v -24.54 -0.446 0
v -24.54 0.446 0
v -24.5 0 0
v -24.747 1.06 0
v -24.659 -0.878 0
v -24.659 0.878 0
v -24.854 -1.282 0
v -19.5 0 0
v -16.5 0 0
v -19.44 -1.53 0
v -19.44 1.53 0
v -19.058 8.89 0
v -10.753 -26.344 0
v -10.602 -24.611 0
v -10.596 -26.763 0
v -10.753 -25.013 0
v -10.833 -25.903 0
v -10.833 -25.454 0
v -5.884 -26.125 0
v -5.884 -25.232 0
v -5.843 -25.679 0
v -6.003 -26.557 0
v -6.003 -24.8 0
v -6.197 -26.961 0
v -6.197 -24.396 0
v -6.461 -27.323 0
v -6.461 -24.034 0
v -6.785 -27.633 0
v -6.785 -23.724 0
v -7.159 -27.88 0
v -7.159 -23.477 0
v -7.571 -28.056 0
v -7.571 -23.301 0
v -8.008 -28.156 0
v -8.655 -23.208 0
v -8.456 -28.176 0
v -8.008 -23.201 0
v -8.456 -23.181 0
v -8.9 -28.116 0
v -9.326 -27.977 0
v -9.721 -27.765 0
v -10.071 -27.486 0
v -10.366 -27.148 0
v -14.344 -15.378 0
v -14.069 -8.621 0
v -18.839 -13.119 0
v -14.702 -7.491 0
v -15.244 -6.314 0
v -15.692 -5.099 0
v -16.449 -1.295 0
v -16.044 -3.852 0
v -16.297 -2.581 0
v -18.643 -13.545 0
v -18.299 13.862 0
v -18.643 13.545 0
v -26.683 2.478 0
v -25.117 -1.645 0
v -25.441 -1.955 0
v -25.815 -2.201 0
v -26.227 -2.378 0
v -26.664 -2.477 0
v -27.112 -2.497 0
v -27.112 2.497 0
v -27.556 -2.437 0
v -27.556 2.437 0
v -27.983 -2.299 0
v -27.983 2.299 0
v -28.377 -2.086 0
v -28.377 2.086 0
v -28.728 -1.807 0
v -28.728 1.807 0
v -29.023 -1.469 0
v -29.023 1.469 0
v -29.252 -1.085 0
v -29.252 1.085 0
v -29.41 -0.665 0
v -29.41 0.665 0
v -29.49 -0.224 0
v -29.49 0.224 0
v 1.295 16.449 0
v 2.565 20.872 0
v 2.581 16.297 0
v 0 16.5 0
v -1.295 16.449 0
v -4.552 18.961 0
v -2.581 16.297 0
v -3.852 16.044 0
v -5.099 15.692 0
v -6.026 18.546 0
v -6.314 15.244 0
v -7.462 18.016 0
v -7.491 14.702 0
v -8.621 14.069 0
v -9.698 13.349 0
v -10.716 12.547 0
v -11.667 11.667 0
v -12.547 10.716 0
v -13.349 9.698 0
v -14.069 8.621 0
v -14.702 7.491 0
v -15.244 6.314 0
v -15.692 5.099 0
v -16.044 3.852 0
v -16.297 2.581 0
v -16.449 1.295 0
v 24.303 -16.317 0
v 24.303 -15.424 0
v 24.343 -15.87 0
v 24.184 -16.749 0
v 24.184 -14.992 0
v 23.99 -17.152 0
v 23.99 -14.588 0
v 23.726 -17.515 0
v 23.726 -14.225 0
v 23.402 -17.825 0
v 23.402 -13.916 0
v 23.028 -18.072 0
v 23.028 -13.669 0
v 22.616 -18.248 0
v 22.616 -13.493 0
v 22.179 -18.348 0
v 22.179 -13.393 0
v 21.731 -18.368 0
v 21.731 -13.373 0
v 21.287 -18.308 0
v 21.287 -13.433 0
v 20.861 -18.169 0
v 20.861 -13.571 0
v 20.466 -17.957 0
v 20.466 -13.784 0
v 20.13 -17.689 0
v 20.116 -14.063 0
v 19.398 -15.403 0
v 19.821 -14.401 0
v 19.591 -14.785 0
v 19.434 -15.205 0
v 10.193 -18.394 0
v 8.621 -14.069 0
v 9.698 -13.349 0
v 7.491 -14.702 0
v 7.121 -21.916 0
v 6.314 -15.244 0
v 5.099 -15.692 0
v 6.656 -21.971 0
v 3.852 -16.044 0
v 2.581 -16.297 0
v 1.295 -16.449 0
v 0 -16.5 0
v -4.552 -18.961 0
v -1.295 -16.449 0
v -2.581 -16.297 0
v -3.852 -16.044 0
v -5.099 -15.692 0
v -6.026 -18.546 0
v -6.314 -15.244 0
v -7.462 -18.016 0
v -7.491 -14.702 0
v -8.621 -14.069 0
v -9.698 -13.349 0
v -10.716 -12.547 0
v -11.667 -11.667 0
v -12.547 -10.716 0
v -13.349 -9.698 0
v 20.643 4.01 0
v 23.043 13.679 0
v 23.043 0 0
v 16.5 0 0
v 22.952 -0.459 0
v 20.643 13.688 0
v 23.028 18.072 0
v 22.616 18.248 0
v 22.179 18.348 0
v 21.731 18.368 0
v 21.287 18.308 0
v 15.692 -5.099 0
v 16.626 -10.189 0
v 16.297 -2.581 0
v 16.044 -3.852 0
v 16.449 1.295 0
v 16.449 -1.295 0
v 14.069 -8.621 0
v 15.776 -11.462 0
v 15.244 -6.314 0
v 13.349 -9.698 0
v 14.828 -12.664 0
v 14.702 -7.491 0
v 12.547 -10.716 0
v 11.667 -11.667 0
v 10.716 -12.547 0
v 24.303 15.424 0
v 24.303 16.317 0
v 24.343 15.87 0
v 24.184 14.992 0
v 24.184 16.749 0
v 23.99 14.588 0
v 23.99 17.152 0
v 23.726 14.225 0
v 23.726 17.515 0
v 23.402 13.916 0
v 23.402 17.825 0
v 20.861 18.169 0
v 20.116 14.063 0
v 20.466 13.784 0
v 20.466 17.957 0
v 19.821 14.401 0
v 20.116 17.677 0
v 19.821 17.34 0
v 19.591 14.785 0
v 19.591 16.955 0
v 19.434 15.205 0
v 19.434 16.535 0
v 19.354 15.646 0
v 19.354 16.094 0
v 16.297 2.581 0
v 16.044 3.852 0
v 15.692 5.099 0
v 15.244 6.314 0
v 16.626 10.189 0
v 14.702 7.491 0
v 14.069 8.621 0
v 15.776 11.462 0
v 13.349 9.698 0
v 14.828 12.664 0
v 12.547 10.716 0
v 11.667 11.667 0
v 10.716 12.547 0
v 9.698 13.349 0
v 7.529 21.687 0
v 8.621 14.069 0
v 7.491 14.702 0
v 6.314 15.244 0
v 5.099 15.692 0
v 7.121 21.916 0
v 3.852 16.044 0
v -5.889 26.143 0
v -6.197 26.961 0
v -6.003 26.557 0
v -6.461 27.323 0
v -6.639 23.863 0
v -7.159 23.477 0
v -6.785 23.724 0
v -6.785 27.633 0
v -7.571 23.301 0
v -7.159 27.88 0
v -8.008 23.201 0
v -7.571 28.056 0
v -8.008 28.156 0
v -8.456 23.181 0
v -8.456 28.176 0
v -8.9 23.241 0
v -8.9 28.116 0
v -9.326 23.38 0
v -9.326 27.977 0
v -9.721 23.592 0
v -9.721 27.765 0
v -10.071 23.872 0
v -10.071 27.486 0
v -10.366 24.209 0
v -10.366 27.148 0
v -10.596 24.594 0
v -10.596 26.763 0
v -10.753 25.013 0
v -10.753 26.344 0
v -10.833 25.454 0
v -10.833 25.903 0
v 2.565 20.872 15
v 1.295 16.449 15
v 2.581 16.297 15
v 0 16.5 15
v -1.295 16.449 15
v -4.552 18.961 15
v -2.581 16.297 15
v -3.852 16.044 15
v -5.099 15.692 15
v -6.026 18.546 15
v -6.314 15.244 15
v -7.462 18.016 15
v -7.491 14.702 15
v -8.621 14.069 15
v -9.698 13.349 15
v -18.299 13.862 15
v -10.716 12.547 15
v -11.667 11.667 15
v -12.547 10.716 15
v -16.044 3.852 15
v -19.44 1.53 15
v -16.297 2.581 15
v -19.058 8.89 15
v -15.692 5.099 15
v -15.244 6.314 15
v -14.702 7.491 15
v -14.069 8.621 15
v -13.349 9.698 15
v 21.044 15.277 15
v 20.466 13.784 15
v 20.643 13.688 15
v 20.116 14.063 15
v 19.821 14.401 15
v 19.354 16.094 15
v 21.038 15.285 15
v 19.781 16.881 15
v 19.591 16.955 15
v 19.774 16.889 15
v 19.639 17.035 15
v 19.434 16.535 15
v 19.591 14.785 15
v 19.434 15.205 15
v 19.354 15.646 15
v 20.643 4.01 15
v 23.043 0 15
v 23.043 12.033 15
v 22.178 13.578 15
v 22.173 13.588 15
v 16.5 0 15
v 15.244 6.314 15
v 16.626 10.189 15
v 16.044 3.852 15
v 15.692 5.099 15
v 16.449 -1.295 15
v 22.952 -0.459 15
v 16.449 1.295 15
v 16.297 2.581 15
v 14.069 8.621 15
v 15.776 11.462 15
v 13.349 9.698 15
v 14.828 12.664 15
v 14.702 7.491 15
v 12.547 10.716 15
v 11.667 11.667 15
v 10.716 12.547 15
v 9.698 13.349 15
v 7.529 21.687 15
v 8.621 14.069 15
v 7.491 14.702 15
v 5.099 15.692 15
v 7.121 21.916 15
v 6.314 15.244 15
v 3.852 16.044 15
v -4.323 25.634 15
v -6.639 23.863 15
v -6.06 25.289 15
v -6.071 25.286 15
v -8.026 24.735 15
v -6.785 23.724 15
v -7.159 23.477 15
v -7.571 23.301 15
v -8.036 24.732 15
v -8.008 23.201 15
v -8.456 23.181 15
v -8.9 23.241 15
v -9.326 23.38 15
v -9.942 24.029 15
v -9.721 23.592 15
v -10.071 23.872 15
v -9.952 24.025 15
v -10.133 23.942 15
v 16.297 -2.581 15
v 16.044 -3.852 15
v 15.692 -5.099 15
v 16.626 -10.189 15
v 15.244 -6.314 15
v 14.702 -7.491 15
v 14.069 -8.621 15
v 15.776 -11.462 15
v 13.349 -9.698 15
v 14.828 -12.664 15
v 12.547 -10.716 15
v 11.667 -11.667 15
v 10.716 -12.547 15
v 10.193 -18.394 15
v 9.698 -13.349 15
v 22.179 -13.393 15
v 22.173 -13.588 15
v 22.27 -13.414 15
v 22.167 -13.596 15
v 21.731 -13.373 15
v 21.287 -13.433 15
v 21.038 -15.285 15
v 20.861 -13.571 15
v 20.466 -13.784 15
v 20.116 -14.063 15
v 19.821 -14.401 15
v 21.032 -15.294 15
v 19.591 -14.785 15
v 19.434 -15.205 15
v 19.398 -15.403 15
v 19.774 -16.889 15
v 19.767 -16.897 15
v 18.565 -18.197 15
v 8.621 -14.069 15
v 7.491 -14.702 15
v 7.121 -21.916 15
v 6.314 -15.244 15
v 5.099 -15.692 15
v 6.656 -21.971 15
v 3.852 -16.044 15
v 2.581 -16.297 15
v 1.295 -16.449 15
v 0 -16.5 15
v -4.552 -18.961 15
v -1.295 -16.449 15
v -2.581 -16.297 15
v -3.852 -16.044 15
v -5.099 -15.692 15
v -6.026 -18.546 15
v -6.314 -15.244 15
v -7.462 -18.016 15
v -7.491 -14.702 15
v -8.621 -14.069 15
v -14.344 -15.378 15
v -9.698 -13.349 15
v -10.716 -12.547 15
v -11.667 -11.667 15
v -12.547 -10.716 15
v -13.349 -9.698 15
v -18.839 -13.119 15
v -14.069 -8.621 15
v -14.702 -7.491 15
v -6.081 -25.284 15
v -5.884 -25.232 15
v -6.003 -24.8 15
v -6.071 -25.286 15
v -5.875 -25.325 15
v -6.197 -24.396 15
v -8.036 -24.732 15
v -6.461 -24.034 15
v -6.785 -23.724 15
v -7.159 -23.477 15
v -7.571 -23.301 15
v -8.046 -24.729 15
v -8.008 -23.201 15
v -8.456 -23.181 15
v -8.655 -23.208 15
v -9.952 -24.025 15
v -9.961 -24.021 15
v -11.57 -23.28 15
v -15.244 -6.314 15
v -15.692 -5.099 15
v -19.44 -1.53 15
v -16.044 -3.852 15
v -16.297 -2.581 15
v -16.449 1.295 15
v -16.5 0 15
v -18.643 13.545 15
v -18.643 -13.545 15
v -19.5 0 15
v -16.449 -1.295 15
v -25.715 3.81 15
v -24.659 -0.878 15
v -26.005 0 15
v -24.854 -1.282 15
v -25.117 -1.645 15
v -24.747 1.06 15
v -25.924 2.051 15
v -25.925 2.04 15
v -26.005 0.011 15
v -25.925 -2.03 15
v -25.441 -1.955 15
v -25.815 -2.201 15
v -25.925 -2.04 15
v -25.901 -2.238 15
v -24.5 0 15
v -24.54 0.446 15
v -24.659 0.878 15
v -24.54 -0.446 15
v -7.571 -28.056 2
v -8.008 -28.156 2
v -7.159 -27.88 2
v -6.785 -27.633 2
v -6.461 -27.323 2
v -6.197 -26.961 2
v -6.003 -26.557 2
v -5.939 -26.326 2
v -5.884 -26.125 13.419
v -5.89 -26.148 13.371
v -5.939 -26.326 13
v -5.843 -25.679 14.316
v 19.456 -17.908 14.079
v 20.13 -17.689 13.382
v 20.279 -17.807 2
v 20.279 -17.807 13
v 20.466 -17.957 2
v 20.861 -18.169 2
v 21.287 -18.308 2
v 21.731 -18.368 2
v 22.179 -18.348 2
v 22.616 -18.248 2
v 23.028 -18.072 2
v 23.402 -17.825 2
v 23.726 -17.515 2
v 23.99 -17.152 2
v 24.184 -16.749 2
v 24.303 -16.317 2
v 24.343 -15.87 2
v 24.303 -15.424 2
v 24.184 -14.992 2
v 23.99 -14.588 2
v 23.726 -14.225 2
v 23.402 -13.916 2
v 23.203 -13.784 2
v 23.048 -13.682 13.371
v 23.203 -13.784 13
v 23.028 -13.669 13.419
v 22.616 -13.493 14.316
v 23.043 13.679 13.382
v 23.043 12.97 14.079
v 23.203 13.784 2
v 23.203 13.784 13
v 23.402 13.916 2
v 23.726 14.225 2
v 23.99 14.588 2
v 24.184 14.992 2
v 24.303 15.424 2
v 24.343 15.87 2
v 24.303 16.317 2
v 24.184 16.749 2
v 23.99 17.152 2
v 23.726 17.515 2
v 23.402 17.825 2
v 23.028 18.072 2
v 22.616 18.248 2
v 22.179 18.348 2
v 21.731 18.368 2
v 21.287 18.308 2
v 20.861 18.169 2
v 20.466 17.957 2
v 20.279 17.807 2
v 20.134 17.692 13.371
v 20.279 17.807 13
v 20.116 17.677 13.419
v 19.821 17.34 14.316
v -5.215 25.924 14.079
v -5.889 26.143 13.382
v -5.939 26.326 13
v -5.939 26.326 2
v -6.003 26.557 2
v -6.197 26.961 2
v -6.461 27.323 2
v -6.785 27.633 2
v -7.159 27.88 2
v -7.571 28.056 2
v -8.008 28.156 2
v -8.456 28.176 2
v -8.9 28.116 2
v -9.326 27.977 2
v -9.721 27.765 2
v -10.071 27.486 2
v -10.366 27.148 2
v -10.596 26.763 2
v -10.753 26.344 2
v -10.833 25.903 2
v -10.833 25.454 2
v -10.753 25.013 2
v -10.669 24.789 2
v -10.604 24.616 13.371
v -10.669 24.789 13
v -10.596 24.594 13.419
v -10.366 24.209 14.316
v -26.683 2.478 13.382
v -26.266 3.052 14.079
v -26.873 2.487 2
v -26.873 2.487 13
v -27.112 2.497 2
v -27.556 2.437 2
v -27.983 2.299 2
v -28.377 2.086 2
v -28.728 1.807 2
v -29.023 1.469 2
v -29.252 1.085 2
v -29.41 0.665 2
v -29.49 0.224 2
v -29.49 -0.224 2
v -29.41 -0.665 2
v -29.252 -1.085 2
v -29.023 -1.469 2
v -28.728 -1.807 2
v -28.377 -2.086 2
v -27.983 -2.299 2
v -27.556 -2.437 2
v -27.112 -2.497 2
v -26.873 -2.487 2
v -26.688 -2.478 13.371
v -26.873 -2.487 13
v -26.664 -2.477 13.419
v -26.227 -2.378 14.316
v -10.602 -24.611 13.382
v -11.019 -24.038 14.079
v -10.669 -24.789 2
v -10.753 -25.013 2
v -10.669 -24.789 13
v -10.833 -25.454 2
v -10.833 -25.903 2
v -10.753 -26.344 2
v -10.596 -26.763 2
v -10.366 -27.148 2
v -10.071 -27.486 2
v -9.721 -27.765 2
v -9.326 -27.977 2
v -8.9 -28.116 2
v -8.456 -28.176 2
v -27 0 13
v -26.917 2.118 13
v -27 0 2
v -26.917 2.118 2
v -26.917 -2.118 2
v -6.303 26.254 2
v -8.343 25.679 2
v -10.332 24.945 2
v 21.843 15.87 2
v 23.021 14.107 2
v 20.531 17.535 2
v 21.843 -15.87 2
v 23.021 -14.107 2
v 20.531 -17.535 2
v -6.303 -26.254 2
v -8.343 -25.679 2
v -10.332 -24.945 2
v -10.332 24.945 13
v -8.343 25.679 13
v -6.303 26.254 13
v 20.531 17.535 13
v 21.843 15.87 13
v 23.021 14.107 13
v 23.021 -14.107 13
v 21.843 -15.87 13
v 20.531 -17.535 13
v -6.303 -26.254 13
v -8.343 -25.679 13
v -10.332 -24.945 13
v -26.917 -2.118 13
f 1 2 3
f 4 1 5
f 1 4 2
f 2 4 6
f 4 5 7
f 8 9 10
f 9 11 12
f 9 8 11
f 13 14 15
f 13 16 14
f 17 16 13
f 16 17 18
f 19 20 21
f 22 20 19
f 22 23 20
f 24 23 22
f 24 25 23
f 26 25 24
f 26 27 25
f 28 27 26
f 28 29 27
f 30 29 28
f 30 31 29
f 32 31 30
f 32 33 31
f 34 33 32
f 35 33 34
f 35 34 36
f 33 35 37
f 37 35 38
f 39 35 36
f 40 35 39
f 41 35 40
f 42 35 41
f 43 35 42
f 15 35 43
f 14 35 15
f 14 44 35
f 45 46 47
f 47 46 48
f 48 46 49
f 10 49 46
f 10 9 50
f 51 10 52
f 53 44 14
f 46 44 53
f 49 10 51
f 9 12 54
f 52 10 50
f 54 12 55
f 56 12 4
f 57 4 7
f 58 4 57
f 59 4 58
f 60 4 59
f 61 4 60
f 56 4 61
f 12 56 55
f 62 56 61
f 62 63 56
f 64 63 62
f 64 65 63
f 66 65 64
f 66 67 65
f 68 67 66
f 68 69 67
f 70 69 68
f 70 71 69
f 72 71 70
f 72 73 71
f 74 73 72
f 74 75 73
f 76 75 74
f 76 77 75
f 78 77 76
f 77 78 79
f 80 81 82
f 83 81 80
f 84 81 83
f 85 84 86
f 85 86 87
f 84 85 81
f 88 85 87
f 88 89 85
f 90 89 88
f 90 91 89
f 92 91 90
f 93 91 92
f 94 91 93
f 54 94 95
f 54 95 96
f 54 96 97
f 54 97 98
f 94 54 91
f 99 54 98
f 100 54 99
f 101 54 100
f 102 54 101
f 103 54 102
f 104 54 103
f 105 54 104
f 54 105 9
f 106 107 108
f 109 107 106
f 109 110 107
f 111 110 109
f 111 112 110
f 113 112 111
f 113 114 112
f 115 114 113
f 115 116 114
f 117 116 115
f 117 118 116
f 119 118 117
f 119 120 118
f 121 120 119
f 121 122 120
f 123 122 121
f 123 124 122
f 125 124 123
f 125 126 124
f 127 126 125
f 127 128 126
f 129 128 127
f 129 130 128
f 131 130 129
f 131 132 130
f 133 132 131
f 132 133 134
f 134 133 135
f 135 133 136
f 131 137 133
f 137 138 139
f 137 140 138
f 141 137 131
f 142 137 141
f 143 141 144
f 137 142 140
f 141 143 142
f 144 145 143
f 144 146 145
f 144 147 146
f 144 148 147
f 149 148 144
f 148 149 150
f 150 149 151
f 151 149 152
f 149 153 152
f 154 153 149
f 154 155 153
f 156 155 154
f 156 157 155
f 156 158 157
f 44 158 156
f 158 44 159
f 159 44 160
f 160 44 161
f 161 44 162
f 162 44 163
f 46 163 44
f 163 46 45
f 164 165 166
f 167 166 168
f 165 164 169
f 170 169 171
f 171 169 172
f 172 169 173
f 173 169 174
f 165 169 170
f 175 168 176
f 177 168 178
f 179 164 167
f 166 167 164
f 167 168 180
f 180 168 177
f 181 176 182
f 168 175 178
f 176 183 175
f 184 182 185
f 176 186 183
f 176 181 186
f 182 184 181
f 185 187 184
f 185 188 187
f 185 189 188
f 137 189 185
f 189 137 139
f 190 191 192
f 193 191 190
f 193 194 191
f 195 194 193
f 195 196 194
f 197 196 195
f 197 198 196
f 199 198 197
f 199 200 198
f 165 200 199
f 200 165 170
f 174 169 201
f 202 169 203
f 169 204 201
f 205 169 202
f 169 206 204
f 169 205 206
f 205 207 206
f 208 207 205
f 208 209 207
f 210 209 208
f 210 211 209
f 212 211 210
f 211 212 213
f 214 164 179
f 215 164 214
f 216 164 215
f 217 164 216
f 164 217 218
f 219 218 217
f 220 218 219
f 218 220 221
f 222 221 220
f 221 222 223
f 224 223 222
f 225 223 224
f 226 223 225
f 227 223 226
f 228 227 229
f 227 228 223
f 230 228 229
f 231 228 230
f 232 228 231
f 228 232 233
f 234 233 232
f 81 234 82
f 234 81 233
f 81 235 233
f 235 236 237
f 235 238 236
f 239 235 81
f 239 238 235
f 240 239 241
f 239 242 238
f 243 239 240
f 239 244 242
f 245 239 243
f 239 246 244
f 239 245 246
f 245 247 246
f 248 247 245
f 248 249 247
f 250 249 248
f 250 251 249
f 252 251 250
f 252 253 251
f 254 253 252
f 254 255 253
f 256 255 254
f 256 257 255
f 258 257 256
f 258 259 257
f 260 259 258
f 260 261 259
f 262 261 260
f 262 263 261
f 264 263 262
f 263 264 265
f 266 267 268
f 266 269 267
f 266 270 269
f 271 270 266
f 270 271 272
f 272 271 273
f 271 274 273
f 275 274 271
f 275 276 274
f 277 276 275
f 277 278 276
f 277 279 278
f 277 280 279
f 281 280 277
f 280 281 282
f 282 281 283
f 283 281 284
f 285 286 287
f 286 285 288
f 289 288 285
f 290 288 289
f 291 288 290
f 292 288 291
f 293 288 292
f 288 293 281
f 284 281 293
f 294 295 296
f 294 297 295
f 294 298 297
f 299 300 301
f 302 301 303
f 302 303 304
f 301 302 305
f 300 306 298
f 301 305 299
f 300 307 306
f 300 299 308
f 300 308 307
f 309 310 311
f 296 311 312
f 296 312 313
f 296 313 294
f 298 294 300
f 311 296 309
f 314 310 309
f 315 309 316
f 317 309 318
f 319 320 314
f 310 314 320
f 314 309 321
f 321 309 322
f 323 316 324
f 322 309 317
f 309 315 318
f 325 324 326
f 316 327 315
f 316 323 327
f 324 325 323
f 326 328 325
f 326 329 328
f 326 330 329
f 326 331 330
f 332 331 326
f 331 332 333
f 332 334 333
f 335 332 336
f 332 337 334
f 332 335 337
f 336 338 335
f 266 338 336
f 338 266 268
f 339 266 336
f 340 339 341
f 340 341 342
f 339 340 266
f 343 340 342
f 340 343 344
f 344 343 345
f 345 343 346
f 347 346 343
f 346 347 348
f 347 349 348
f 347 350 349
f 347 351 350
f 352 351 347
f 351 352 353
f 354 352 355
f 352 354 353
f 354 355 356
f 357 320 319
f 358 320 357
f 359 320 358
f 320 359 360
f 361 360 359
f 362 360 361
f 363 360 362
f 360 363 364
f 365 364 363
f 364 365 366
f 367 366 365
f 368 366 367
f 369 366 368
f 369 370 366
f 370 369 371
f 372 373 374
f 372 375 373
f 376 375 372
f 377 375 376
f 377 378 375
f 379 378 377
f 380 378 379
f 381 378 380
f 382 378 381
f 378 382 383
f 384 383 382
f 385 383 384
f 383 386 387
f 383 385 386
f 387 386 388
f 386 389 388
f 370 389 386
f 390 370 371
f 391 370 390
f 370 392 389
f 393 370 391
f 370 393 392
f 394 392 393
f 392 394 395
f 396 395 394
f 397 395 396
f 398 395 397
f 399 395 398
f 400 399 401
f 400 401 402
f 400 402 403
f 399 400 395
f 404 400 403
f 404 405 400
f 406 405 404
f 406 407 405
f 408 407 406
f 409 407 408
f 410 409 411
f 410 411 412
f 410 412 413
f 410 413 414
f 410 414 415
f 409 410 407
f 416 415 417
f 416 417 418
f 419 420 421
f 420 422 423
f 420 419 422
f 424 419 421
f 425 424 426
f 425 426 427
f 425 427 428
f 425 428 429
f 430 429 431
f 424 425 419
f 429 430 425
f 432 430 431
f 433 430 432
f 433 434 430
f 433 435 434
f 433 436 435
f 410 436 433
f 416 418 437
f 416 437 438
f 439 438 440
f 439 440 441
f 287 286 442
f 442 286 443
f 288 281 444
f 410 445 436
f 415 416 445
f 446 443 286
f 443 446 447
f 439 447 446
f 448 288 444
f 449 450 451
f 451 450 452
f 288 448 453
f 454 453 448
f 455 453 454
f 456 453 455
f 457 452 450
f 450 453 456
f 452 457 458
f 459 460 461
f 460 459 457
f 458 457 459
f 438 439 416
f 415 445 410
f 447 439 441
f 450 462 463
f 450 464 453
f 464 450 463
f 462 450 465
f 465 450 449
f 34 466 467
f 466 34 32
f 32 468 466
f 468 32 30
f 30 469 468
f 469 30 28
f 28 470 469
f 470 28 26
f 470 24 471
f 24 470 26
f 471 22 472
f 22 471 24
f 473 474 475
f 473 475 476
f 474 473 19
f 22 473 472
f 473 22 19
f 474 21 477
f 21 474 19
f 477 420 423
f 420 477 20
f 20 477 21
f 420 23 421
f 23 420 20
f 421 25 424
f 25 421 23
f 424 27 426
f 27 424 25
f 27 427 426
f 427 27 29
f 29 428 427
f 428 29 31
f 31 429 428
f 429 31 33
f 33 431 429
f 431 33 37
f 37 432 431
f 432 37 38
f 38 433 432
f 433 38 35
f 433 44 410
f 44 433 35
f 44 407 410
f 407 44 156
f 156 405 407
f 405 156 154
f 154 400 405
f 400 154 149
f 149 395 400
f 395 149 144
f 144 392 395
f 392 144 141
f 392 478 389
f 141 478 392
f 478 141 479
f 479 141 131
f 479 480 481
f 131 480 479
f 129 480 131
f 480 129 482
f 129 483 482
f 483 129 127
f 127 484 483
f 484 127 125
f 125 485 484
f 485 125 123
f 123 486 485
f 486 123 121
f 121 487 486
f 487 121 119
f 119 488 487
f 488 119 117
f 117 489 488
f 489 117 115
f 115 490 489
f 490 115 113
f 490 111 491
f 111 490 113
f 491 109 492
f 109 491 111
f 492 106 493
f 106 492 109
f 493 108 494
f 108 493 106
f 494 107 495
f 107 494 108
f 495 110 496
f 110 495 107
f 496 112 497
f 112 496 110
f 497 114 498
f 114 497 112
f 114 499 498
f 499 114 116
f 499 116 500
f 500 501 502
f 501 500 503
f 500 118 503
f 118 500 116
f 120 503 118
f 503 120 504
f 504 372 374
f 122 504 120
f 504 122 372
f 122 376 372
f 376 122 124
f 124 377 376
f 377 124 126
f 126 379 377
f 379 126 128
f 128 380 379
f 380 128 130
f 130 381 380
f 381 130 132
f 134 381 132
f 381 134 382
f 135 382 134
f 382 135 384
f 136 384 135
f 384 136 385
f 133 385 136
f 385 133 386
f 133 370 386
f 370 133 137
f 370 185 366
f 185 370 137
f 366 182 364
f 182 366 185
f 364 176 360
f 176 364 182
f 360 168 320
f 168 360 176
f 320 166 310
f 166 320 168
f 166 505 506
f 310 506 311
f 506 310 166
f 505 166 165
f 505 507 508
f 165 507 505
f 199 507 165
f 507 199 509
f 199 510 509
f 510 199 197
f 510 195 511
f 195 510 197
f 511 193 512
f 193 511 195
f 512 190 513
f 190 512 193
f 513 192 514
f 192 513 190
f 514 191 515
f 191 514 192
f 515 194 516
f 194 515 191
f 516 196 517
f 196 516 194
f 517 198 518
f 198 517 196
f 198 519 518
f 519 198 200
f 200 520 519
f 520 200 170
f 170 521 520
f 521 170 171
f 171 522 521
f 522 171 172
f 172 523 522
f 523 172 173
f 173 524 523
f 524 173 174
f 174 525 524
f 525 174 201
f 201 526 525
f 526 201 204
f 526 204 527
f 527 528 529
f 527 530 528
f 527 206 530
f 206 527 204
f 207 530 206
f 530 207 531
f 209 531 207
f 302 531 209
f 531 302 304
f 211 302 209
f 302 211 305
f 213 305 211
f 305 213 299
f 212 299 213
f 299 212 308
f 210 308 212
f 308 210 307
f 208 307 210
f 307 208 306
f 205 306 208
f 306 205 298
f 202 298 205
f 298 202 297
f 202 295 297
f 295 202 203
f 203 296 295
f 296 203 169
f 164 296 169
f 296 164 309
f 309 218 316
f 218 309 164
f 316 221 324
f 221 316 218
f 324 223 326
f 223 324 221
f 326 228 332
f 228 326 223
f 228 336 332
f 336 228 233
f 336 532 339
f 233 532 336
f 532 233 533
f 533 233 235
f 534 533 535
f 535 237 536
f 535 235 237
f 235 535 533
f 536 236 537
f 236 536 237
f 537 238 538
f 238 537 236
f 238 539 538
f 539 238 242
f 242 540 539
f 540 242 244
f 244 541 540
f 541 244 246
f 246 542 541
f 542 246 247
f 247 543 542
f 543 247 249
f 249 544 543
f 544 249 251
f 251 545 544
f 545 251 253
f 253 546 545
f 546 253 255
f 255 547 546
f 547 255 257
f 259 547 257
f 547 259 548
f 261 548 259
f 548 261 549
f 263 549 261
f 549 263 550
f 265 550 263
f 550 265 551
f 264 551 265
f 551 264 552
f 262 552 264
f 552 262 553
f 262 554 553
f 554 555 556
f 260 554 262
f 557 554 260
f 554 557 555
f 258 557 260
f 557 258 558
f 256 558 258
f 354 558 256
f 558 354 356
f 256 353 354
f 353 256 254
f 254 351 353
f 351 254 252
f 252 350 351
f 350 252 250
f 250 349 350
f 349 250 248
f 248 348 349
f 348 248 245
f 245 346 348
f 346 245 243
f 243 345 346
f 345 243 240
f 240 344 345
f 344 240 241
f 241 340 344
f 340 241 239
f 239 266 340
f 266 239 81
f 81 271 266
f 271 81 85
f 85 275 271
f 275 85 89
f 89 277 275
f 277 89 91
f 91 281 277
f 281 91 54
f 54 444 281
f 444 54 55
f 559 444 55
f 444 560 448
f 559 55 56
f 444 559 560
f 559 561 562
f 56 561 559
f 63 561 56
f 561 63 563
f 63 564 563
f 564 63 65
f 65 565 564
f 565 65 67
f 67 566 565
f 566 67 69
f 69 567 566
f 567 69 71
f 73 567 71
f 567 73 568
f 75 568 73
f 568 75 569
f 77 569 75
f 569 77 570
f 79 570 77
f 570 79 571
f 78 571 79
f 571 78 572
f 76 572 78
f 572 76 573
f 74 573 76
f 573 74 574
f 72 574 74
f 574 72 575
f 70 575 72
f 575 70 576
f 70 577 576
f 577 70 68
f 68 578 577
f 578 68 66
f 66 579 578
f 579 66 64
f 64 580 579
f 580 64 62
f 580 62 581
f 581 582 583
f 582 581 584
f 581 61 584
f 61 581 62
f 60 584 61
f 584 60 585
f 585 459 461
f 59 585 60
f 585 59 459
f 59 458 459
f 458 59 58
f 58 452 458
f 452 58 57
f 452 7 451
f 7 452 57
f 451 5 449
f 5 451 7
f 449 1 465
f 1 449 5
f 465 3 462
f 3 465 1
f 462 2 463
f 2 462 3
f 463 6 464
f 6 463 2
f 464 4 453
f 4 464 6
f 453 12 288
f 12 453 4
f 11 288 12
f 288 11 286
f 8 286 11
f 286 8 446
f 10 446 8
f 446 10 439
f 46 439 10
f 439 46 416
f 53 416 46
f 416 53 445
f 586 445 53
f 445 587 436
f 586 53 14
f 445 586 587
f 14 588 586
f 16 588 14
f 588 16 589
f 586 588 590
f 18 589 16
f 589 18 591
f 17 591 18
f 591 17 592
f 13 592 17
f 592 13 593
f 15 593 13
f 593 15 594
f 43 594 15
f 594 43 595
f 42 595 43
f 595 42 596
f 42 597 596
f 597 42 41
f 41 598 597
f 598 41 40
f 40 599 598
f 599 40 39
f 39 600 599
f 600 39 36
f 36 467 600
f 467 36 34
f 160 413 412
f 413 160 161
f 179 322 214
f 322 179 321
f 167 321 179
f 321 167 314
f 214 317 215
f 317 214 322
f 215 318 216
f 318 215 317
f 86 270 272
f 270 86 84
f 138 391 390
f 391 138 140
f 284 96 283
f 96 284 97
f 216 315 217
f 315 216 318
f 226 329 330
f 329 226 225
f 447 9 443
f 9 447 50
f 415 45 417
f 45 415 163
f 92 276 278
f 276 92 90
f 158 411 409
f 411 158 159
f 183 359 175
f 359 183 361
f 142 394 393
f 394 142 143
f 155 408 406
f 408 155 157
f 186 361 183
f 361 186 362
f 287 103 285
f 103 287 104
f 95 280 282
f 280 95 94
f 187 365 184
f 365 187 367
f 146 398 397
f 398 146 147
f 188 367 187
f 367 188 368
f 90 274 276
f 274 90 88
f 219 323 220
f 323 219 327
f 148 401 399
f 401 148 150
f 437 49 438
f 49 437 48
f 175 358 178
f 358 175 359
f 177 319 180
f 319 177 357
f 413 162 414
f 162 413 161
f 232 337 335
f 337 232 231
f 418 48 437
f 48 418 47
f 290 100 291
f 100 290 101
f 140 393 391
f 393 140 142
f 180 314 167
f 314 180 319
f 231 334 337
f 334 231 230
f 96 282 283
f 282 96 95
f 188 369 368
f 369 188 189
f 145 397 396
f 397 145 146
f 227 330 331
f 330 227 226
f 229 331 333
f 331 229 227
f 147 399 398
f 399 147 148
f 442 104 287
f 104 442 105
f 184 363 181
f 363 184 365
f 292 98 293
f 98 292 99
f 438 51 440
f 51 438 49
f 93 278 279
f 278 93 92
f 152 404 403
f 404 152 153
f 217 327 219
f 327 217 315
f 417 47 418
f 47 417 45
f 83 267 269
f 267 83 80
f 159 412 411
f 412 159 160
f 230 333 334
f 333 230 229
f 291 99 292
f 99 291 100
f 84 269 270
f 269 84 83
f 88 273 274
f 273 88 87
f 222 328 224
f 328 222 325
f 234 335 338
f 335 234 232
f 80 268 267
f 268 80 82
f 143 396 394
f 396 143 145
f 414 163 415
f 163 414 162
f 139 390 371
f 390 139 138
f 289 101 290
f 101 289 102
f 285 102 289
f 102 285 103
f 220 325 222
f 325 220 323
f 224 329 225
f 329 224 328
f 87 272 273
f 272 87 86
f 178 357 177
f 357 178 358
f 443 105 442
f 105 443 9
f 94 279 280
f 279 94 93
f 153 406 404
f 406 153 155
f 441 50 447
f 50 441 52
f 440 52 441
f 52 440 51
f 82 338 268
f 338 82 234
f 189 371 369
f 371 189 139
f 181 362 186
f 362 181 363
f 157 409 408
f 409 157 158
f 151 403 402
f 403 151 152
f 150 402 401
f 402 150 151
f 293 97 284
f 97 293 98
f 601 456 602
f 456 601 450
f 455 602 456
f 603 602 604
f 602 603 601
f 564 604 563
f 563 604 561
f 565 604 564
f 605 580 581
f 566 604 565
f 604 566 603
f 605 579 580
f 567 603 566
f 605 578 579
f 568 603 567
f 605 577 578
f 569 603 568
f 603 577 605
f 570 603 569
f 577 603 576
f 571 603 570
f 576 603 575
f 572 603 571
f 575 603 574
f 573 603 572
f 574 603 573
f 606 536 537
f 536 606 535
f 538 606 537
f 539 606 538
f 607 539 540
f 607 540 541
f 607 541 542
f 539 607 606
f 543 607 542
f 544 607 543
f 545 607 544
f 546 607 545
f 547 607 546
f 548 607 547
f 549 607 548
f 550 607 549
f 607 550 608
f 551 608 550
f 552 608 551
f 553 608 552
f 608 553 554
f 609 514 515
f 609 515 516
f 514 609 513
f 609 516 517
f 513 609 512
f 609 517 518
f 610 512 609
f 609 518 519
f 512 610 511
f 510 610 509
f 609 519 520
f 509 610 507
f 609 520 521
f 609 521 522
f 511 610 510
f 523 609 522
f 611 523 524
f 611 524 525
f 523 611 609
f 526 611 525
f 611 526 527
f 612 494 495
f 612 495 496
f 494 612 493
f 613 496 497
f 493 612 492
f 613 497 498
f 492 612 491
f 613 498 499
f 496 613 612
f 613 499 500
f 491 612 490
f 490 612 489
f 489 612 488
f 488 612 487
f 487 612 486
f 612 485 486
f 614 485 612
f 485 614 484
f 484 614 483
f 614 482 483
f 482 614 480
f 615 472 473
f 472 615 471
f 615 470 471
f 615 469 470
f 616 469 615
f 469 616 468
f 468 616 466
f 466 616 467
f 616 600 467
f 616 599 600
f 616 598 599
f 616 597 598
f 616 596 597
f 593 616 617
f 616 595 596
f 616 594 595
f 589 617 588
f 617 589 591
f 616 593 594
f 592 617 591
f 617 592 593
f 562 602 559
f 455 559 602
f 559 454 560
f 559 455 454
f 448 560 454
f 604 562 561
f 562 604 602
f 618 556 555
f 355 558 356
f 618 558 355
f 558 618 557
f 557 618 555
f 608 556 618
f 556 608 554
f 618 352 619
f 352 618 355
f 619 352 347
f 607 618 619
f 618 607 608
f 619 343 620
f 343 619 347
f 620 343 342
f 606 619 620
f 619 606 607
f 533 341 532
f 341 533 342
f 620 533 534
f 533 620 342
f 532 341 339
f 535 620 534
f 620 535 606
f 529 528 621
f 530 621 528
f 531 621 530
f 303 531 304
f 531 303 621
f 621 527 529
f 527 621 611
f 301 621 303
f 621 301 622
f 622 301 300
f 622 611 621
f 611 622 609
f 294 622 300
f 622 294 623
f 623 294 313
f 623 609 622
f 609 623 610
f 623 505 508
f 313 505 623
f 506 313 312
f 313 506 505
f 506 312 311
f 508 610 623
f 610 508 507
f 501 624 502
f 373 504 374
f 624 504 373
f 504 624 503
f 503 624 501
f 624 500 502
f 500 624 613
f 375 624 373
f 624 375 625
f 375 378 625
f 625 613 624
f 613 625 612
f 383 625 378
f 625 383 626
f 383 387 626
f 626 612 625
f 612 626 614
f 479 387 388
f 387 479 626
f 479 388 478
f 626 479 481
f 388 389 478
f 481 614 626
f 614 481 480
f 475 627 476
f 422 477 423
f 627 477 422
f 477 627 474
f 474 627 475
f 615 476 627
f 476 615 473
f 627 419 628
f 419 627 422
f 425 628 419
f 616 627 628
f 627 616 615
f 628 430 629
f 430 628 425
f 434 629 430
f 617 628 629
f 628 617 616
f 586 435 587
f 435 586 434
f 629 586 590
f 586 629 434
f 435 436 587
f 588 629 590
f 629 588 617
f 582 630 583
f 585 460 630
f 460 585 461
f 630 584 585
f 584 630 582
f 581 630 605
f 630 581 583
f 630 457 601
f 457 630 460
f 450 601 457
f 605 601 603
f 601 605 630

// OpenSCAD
// 'Customizable Spool Adapter' by wstein 
// is licensed under the Attribution - Non-Commercial - Share Alike license. 
// Version 1.3.1 (c) November 2015
// please refer the complete license here: http://creativecommons.org/licenses/by-sa/3.0/legalcode
//
// V1.4: inner hole fix (see http://www.thingiverse.com/thing:1151473)
// V1.3.1: Bug fixed for latest customizer
// V1.3: Customizer creation failure fixed. Some smaller issues fixed. More slider used. New license cc-by-sa!
// V1.2: part handling optimized
// V1.1a: UI optimized
// V1.1: new star shape

// preview[view:south, tilt:top diagonal]

//to show. This setting is only relevant for preview.
part="right"; //[right:Right,left:Left,straight:Straight,star_right:Star Right,star_left:Star Left]

//depended on the inner and outer diameter, you may also need to change the "Arms" settings to get a perfect working adapter. 
tube_diameter=32; //[0:0.5:75]
spool_diameter=53; //[0:1:150]
height=15; //[0:100]
number_of_arms=5; //[3:10]
function get_number_of_arms() = (part == "straight" && number_of_arms % 2 > 0 ? 1 : 0) + number_of_arms;

/*[Advanced]*/

inner_diameter_backlash=1.0; //[0:0.1:5]
collar_thickness=2.0; //[0:0.5:10]
chamfer_depth=2.0; //[0:0.5:20]
wall=3.0; //[0:0.1:10]

/*[Arms]*/

//I used 2mm on 32/53 Adapter with 6 arms and 2.4mm with 5 arms. It depends on the length.
arm_thickness=2.4; //[0:0.1:5]
//in mm. The adapter should fit tight to the spool, so the outer diameter is enlarged by this value.
arm_compression=1.0; //[0:0.1:5]
// in mm
arm_end_diameter=5.0; //[0:0.5:20]

/*[Expert]*/
quality=80; //[60:Normal,80:Good,100:High]

function get_part_index() = search([part], ["right","left","straight","star_right","star_left"])[0];

/*[Hidden]*/


inner_diameter=tube_diameter+inner_diameter_backlash;
outer_diameter=spool_diameter+arm_compression;

outer_shape=[

    [outer_diameter/2+arm_end_diameter+.1,collar_thickness],
    [outer_diameter/2,collar_thickness],
    [outer_diameter/2,height-chamfer_depth],
    [spool_diameter/2-.5,height+0.01],
    [outer_diameter/2+arm_end_diameter+.1,height+0.01],
];

number=part == "straight"?get_number_of_arms()/2:get_number_of_arms();

arm_degree=360/get_number_of_arms();
degree=360/number;

difference()
{   
    linear_extrude(convexity=20,height=height)
    union()
    {
        if(get_part_index()>2)
        for(a=[0:degree:359])
        hull()
        {
            circle(r=inner_diameter/2+wall,$fn=quality);
            
            rotate([0,0,a])
            translate([cos_arm,0,0])
            circle(r=arm_thickness/2,$fn=arm_thickness*7);
        }
        else
        hull()
        {
            circle(r=inner_diameter/2+wall,$fn=quality);
            
            for(a=[0:degree:359])
            rotate([0,0,a])
            translate([cos_arm,0,0])
            circle(r=arm_thickness/2,$fn=arm_thickness*7);
        }
        
        for(a=[0:degree:359])
        rotate([0,0,a])
        for(i=[0:len(arm_paths[get_part_index()])-2])
        hull()
        for(j=[i:i+1])
        translate(arm_paths[get_part_index()][j])
        circle(r=arm_thickness/2,$fn=arm_thickness*7);
        
        for(a=[0:360/get_number_of_arms():359])
        rotate([0,0,a])
        translate([cos_arm,sin_arm])
        circle(r=arm_end_diameter/2,$fn=arm_end_diameter*7);       
    }
    
    translate([0,0,-1])
    cylinder(r=inner_diameter/2, h=height+2, $fn=quality);

    rotate_extrude(convexity=20,$fn=quality)
    polygon(outer_shape);
}

sin_arm=sin(arm_degree/2)*outer_diameter/2;
cos_arm=cos(arm_degree/2)*outer_diameter/2;
arm_paths=[
    // right
    [
        [cos_arm,0],
        [cos_arm,sin_arm],
    ],
    // left
    [
        [cos_arm,0],
        [cos_arm,-sin_arm],
    ],
    // straight
    [
        [cos_arm,sin_arm],
        [cos_arm,-sin_arm],
    ],
    // right star
    [
        [cos_arm,0],
        [cos_arm,sin_arm],
    ],
    // left star
    [
        [cos_arm,0],
        [cos_arm,-sin_arm],
    ],
];
